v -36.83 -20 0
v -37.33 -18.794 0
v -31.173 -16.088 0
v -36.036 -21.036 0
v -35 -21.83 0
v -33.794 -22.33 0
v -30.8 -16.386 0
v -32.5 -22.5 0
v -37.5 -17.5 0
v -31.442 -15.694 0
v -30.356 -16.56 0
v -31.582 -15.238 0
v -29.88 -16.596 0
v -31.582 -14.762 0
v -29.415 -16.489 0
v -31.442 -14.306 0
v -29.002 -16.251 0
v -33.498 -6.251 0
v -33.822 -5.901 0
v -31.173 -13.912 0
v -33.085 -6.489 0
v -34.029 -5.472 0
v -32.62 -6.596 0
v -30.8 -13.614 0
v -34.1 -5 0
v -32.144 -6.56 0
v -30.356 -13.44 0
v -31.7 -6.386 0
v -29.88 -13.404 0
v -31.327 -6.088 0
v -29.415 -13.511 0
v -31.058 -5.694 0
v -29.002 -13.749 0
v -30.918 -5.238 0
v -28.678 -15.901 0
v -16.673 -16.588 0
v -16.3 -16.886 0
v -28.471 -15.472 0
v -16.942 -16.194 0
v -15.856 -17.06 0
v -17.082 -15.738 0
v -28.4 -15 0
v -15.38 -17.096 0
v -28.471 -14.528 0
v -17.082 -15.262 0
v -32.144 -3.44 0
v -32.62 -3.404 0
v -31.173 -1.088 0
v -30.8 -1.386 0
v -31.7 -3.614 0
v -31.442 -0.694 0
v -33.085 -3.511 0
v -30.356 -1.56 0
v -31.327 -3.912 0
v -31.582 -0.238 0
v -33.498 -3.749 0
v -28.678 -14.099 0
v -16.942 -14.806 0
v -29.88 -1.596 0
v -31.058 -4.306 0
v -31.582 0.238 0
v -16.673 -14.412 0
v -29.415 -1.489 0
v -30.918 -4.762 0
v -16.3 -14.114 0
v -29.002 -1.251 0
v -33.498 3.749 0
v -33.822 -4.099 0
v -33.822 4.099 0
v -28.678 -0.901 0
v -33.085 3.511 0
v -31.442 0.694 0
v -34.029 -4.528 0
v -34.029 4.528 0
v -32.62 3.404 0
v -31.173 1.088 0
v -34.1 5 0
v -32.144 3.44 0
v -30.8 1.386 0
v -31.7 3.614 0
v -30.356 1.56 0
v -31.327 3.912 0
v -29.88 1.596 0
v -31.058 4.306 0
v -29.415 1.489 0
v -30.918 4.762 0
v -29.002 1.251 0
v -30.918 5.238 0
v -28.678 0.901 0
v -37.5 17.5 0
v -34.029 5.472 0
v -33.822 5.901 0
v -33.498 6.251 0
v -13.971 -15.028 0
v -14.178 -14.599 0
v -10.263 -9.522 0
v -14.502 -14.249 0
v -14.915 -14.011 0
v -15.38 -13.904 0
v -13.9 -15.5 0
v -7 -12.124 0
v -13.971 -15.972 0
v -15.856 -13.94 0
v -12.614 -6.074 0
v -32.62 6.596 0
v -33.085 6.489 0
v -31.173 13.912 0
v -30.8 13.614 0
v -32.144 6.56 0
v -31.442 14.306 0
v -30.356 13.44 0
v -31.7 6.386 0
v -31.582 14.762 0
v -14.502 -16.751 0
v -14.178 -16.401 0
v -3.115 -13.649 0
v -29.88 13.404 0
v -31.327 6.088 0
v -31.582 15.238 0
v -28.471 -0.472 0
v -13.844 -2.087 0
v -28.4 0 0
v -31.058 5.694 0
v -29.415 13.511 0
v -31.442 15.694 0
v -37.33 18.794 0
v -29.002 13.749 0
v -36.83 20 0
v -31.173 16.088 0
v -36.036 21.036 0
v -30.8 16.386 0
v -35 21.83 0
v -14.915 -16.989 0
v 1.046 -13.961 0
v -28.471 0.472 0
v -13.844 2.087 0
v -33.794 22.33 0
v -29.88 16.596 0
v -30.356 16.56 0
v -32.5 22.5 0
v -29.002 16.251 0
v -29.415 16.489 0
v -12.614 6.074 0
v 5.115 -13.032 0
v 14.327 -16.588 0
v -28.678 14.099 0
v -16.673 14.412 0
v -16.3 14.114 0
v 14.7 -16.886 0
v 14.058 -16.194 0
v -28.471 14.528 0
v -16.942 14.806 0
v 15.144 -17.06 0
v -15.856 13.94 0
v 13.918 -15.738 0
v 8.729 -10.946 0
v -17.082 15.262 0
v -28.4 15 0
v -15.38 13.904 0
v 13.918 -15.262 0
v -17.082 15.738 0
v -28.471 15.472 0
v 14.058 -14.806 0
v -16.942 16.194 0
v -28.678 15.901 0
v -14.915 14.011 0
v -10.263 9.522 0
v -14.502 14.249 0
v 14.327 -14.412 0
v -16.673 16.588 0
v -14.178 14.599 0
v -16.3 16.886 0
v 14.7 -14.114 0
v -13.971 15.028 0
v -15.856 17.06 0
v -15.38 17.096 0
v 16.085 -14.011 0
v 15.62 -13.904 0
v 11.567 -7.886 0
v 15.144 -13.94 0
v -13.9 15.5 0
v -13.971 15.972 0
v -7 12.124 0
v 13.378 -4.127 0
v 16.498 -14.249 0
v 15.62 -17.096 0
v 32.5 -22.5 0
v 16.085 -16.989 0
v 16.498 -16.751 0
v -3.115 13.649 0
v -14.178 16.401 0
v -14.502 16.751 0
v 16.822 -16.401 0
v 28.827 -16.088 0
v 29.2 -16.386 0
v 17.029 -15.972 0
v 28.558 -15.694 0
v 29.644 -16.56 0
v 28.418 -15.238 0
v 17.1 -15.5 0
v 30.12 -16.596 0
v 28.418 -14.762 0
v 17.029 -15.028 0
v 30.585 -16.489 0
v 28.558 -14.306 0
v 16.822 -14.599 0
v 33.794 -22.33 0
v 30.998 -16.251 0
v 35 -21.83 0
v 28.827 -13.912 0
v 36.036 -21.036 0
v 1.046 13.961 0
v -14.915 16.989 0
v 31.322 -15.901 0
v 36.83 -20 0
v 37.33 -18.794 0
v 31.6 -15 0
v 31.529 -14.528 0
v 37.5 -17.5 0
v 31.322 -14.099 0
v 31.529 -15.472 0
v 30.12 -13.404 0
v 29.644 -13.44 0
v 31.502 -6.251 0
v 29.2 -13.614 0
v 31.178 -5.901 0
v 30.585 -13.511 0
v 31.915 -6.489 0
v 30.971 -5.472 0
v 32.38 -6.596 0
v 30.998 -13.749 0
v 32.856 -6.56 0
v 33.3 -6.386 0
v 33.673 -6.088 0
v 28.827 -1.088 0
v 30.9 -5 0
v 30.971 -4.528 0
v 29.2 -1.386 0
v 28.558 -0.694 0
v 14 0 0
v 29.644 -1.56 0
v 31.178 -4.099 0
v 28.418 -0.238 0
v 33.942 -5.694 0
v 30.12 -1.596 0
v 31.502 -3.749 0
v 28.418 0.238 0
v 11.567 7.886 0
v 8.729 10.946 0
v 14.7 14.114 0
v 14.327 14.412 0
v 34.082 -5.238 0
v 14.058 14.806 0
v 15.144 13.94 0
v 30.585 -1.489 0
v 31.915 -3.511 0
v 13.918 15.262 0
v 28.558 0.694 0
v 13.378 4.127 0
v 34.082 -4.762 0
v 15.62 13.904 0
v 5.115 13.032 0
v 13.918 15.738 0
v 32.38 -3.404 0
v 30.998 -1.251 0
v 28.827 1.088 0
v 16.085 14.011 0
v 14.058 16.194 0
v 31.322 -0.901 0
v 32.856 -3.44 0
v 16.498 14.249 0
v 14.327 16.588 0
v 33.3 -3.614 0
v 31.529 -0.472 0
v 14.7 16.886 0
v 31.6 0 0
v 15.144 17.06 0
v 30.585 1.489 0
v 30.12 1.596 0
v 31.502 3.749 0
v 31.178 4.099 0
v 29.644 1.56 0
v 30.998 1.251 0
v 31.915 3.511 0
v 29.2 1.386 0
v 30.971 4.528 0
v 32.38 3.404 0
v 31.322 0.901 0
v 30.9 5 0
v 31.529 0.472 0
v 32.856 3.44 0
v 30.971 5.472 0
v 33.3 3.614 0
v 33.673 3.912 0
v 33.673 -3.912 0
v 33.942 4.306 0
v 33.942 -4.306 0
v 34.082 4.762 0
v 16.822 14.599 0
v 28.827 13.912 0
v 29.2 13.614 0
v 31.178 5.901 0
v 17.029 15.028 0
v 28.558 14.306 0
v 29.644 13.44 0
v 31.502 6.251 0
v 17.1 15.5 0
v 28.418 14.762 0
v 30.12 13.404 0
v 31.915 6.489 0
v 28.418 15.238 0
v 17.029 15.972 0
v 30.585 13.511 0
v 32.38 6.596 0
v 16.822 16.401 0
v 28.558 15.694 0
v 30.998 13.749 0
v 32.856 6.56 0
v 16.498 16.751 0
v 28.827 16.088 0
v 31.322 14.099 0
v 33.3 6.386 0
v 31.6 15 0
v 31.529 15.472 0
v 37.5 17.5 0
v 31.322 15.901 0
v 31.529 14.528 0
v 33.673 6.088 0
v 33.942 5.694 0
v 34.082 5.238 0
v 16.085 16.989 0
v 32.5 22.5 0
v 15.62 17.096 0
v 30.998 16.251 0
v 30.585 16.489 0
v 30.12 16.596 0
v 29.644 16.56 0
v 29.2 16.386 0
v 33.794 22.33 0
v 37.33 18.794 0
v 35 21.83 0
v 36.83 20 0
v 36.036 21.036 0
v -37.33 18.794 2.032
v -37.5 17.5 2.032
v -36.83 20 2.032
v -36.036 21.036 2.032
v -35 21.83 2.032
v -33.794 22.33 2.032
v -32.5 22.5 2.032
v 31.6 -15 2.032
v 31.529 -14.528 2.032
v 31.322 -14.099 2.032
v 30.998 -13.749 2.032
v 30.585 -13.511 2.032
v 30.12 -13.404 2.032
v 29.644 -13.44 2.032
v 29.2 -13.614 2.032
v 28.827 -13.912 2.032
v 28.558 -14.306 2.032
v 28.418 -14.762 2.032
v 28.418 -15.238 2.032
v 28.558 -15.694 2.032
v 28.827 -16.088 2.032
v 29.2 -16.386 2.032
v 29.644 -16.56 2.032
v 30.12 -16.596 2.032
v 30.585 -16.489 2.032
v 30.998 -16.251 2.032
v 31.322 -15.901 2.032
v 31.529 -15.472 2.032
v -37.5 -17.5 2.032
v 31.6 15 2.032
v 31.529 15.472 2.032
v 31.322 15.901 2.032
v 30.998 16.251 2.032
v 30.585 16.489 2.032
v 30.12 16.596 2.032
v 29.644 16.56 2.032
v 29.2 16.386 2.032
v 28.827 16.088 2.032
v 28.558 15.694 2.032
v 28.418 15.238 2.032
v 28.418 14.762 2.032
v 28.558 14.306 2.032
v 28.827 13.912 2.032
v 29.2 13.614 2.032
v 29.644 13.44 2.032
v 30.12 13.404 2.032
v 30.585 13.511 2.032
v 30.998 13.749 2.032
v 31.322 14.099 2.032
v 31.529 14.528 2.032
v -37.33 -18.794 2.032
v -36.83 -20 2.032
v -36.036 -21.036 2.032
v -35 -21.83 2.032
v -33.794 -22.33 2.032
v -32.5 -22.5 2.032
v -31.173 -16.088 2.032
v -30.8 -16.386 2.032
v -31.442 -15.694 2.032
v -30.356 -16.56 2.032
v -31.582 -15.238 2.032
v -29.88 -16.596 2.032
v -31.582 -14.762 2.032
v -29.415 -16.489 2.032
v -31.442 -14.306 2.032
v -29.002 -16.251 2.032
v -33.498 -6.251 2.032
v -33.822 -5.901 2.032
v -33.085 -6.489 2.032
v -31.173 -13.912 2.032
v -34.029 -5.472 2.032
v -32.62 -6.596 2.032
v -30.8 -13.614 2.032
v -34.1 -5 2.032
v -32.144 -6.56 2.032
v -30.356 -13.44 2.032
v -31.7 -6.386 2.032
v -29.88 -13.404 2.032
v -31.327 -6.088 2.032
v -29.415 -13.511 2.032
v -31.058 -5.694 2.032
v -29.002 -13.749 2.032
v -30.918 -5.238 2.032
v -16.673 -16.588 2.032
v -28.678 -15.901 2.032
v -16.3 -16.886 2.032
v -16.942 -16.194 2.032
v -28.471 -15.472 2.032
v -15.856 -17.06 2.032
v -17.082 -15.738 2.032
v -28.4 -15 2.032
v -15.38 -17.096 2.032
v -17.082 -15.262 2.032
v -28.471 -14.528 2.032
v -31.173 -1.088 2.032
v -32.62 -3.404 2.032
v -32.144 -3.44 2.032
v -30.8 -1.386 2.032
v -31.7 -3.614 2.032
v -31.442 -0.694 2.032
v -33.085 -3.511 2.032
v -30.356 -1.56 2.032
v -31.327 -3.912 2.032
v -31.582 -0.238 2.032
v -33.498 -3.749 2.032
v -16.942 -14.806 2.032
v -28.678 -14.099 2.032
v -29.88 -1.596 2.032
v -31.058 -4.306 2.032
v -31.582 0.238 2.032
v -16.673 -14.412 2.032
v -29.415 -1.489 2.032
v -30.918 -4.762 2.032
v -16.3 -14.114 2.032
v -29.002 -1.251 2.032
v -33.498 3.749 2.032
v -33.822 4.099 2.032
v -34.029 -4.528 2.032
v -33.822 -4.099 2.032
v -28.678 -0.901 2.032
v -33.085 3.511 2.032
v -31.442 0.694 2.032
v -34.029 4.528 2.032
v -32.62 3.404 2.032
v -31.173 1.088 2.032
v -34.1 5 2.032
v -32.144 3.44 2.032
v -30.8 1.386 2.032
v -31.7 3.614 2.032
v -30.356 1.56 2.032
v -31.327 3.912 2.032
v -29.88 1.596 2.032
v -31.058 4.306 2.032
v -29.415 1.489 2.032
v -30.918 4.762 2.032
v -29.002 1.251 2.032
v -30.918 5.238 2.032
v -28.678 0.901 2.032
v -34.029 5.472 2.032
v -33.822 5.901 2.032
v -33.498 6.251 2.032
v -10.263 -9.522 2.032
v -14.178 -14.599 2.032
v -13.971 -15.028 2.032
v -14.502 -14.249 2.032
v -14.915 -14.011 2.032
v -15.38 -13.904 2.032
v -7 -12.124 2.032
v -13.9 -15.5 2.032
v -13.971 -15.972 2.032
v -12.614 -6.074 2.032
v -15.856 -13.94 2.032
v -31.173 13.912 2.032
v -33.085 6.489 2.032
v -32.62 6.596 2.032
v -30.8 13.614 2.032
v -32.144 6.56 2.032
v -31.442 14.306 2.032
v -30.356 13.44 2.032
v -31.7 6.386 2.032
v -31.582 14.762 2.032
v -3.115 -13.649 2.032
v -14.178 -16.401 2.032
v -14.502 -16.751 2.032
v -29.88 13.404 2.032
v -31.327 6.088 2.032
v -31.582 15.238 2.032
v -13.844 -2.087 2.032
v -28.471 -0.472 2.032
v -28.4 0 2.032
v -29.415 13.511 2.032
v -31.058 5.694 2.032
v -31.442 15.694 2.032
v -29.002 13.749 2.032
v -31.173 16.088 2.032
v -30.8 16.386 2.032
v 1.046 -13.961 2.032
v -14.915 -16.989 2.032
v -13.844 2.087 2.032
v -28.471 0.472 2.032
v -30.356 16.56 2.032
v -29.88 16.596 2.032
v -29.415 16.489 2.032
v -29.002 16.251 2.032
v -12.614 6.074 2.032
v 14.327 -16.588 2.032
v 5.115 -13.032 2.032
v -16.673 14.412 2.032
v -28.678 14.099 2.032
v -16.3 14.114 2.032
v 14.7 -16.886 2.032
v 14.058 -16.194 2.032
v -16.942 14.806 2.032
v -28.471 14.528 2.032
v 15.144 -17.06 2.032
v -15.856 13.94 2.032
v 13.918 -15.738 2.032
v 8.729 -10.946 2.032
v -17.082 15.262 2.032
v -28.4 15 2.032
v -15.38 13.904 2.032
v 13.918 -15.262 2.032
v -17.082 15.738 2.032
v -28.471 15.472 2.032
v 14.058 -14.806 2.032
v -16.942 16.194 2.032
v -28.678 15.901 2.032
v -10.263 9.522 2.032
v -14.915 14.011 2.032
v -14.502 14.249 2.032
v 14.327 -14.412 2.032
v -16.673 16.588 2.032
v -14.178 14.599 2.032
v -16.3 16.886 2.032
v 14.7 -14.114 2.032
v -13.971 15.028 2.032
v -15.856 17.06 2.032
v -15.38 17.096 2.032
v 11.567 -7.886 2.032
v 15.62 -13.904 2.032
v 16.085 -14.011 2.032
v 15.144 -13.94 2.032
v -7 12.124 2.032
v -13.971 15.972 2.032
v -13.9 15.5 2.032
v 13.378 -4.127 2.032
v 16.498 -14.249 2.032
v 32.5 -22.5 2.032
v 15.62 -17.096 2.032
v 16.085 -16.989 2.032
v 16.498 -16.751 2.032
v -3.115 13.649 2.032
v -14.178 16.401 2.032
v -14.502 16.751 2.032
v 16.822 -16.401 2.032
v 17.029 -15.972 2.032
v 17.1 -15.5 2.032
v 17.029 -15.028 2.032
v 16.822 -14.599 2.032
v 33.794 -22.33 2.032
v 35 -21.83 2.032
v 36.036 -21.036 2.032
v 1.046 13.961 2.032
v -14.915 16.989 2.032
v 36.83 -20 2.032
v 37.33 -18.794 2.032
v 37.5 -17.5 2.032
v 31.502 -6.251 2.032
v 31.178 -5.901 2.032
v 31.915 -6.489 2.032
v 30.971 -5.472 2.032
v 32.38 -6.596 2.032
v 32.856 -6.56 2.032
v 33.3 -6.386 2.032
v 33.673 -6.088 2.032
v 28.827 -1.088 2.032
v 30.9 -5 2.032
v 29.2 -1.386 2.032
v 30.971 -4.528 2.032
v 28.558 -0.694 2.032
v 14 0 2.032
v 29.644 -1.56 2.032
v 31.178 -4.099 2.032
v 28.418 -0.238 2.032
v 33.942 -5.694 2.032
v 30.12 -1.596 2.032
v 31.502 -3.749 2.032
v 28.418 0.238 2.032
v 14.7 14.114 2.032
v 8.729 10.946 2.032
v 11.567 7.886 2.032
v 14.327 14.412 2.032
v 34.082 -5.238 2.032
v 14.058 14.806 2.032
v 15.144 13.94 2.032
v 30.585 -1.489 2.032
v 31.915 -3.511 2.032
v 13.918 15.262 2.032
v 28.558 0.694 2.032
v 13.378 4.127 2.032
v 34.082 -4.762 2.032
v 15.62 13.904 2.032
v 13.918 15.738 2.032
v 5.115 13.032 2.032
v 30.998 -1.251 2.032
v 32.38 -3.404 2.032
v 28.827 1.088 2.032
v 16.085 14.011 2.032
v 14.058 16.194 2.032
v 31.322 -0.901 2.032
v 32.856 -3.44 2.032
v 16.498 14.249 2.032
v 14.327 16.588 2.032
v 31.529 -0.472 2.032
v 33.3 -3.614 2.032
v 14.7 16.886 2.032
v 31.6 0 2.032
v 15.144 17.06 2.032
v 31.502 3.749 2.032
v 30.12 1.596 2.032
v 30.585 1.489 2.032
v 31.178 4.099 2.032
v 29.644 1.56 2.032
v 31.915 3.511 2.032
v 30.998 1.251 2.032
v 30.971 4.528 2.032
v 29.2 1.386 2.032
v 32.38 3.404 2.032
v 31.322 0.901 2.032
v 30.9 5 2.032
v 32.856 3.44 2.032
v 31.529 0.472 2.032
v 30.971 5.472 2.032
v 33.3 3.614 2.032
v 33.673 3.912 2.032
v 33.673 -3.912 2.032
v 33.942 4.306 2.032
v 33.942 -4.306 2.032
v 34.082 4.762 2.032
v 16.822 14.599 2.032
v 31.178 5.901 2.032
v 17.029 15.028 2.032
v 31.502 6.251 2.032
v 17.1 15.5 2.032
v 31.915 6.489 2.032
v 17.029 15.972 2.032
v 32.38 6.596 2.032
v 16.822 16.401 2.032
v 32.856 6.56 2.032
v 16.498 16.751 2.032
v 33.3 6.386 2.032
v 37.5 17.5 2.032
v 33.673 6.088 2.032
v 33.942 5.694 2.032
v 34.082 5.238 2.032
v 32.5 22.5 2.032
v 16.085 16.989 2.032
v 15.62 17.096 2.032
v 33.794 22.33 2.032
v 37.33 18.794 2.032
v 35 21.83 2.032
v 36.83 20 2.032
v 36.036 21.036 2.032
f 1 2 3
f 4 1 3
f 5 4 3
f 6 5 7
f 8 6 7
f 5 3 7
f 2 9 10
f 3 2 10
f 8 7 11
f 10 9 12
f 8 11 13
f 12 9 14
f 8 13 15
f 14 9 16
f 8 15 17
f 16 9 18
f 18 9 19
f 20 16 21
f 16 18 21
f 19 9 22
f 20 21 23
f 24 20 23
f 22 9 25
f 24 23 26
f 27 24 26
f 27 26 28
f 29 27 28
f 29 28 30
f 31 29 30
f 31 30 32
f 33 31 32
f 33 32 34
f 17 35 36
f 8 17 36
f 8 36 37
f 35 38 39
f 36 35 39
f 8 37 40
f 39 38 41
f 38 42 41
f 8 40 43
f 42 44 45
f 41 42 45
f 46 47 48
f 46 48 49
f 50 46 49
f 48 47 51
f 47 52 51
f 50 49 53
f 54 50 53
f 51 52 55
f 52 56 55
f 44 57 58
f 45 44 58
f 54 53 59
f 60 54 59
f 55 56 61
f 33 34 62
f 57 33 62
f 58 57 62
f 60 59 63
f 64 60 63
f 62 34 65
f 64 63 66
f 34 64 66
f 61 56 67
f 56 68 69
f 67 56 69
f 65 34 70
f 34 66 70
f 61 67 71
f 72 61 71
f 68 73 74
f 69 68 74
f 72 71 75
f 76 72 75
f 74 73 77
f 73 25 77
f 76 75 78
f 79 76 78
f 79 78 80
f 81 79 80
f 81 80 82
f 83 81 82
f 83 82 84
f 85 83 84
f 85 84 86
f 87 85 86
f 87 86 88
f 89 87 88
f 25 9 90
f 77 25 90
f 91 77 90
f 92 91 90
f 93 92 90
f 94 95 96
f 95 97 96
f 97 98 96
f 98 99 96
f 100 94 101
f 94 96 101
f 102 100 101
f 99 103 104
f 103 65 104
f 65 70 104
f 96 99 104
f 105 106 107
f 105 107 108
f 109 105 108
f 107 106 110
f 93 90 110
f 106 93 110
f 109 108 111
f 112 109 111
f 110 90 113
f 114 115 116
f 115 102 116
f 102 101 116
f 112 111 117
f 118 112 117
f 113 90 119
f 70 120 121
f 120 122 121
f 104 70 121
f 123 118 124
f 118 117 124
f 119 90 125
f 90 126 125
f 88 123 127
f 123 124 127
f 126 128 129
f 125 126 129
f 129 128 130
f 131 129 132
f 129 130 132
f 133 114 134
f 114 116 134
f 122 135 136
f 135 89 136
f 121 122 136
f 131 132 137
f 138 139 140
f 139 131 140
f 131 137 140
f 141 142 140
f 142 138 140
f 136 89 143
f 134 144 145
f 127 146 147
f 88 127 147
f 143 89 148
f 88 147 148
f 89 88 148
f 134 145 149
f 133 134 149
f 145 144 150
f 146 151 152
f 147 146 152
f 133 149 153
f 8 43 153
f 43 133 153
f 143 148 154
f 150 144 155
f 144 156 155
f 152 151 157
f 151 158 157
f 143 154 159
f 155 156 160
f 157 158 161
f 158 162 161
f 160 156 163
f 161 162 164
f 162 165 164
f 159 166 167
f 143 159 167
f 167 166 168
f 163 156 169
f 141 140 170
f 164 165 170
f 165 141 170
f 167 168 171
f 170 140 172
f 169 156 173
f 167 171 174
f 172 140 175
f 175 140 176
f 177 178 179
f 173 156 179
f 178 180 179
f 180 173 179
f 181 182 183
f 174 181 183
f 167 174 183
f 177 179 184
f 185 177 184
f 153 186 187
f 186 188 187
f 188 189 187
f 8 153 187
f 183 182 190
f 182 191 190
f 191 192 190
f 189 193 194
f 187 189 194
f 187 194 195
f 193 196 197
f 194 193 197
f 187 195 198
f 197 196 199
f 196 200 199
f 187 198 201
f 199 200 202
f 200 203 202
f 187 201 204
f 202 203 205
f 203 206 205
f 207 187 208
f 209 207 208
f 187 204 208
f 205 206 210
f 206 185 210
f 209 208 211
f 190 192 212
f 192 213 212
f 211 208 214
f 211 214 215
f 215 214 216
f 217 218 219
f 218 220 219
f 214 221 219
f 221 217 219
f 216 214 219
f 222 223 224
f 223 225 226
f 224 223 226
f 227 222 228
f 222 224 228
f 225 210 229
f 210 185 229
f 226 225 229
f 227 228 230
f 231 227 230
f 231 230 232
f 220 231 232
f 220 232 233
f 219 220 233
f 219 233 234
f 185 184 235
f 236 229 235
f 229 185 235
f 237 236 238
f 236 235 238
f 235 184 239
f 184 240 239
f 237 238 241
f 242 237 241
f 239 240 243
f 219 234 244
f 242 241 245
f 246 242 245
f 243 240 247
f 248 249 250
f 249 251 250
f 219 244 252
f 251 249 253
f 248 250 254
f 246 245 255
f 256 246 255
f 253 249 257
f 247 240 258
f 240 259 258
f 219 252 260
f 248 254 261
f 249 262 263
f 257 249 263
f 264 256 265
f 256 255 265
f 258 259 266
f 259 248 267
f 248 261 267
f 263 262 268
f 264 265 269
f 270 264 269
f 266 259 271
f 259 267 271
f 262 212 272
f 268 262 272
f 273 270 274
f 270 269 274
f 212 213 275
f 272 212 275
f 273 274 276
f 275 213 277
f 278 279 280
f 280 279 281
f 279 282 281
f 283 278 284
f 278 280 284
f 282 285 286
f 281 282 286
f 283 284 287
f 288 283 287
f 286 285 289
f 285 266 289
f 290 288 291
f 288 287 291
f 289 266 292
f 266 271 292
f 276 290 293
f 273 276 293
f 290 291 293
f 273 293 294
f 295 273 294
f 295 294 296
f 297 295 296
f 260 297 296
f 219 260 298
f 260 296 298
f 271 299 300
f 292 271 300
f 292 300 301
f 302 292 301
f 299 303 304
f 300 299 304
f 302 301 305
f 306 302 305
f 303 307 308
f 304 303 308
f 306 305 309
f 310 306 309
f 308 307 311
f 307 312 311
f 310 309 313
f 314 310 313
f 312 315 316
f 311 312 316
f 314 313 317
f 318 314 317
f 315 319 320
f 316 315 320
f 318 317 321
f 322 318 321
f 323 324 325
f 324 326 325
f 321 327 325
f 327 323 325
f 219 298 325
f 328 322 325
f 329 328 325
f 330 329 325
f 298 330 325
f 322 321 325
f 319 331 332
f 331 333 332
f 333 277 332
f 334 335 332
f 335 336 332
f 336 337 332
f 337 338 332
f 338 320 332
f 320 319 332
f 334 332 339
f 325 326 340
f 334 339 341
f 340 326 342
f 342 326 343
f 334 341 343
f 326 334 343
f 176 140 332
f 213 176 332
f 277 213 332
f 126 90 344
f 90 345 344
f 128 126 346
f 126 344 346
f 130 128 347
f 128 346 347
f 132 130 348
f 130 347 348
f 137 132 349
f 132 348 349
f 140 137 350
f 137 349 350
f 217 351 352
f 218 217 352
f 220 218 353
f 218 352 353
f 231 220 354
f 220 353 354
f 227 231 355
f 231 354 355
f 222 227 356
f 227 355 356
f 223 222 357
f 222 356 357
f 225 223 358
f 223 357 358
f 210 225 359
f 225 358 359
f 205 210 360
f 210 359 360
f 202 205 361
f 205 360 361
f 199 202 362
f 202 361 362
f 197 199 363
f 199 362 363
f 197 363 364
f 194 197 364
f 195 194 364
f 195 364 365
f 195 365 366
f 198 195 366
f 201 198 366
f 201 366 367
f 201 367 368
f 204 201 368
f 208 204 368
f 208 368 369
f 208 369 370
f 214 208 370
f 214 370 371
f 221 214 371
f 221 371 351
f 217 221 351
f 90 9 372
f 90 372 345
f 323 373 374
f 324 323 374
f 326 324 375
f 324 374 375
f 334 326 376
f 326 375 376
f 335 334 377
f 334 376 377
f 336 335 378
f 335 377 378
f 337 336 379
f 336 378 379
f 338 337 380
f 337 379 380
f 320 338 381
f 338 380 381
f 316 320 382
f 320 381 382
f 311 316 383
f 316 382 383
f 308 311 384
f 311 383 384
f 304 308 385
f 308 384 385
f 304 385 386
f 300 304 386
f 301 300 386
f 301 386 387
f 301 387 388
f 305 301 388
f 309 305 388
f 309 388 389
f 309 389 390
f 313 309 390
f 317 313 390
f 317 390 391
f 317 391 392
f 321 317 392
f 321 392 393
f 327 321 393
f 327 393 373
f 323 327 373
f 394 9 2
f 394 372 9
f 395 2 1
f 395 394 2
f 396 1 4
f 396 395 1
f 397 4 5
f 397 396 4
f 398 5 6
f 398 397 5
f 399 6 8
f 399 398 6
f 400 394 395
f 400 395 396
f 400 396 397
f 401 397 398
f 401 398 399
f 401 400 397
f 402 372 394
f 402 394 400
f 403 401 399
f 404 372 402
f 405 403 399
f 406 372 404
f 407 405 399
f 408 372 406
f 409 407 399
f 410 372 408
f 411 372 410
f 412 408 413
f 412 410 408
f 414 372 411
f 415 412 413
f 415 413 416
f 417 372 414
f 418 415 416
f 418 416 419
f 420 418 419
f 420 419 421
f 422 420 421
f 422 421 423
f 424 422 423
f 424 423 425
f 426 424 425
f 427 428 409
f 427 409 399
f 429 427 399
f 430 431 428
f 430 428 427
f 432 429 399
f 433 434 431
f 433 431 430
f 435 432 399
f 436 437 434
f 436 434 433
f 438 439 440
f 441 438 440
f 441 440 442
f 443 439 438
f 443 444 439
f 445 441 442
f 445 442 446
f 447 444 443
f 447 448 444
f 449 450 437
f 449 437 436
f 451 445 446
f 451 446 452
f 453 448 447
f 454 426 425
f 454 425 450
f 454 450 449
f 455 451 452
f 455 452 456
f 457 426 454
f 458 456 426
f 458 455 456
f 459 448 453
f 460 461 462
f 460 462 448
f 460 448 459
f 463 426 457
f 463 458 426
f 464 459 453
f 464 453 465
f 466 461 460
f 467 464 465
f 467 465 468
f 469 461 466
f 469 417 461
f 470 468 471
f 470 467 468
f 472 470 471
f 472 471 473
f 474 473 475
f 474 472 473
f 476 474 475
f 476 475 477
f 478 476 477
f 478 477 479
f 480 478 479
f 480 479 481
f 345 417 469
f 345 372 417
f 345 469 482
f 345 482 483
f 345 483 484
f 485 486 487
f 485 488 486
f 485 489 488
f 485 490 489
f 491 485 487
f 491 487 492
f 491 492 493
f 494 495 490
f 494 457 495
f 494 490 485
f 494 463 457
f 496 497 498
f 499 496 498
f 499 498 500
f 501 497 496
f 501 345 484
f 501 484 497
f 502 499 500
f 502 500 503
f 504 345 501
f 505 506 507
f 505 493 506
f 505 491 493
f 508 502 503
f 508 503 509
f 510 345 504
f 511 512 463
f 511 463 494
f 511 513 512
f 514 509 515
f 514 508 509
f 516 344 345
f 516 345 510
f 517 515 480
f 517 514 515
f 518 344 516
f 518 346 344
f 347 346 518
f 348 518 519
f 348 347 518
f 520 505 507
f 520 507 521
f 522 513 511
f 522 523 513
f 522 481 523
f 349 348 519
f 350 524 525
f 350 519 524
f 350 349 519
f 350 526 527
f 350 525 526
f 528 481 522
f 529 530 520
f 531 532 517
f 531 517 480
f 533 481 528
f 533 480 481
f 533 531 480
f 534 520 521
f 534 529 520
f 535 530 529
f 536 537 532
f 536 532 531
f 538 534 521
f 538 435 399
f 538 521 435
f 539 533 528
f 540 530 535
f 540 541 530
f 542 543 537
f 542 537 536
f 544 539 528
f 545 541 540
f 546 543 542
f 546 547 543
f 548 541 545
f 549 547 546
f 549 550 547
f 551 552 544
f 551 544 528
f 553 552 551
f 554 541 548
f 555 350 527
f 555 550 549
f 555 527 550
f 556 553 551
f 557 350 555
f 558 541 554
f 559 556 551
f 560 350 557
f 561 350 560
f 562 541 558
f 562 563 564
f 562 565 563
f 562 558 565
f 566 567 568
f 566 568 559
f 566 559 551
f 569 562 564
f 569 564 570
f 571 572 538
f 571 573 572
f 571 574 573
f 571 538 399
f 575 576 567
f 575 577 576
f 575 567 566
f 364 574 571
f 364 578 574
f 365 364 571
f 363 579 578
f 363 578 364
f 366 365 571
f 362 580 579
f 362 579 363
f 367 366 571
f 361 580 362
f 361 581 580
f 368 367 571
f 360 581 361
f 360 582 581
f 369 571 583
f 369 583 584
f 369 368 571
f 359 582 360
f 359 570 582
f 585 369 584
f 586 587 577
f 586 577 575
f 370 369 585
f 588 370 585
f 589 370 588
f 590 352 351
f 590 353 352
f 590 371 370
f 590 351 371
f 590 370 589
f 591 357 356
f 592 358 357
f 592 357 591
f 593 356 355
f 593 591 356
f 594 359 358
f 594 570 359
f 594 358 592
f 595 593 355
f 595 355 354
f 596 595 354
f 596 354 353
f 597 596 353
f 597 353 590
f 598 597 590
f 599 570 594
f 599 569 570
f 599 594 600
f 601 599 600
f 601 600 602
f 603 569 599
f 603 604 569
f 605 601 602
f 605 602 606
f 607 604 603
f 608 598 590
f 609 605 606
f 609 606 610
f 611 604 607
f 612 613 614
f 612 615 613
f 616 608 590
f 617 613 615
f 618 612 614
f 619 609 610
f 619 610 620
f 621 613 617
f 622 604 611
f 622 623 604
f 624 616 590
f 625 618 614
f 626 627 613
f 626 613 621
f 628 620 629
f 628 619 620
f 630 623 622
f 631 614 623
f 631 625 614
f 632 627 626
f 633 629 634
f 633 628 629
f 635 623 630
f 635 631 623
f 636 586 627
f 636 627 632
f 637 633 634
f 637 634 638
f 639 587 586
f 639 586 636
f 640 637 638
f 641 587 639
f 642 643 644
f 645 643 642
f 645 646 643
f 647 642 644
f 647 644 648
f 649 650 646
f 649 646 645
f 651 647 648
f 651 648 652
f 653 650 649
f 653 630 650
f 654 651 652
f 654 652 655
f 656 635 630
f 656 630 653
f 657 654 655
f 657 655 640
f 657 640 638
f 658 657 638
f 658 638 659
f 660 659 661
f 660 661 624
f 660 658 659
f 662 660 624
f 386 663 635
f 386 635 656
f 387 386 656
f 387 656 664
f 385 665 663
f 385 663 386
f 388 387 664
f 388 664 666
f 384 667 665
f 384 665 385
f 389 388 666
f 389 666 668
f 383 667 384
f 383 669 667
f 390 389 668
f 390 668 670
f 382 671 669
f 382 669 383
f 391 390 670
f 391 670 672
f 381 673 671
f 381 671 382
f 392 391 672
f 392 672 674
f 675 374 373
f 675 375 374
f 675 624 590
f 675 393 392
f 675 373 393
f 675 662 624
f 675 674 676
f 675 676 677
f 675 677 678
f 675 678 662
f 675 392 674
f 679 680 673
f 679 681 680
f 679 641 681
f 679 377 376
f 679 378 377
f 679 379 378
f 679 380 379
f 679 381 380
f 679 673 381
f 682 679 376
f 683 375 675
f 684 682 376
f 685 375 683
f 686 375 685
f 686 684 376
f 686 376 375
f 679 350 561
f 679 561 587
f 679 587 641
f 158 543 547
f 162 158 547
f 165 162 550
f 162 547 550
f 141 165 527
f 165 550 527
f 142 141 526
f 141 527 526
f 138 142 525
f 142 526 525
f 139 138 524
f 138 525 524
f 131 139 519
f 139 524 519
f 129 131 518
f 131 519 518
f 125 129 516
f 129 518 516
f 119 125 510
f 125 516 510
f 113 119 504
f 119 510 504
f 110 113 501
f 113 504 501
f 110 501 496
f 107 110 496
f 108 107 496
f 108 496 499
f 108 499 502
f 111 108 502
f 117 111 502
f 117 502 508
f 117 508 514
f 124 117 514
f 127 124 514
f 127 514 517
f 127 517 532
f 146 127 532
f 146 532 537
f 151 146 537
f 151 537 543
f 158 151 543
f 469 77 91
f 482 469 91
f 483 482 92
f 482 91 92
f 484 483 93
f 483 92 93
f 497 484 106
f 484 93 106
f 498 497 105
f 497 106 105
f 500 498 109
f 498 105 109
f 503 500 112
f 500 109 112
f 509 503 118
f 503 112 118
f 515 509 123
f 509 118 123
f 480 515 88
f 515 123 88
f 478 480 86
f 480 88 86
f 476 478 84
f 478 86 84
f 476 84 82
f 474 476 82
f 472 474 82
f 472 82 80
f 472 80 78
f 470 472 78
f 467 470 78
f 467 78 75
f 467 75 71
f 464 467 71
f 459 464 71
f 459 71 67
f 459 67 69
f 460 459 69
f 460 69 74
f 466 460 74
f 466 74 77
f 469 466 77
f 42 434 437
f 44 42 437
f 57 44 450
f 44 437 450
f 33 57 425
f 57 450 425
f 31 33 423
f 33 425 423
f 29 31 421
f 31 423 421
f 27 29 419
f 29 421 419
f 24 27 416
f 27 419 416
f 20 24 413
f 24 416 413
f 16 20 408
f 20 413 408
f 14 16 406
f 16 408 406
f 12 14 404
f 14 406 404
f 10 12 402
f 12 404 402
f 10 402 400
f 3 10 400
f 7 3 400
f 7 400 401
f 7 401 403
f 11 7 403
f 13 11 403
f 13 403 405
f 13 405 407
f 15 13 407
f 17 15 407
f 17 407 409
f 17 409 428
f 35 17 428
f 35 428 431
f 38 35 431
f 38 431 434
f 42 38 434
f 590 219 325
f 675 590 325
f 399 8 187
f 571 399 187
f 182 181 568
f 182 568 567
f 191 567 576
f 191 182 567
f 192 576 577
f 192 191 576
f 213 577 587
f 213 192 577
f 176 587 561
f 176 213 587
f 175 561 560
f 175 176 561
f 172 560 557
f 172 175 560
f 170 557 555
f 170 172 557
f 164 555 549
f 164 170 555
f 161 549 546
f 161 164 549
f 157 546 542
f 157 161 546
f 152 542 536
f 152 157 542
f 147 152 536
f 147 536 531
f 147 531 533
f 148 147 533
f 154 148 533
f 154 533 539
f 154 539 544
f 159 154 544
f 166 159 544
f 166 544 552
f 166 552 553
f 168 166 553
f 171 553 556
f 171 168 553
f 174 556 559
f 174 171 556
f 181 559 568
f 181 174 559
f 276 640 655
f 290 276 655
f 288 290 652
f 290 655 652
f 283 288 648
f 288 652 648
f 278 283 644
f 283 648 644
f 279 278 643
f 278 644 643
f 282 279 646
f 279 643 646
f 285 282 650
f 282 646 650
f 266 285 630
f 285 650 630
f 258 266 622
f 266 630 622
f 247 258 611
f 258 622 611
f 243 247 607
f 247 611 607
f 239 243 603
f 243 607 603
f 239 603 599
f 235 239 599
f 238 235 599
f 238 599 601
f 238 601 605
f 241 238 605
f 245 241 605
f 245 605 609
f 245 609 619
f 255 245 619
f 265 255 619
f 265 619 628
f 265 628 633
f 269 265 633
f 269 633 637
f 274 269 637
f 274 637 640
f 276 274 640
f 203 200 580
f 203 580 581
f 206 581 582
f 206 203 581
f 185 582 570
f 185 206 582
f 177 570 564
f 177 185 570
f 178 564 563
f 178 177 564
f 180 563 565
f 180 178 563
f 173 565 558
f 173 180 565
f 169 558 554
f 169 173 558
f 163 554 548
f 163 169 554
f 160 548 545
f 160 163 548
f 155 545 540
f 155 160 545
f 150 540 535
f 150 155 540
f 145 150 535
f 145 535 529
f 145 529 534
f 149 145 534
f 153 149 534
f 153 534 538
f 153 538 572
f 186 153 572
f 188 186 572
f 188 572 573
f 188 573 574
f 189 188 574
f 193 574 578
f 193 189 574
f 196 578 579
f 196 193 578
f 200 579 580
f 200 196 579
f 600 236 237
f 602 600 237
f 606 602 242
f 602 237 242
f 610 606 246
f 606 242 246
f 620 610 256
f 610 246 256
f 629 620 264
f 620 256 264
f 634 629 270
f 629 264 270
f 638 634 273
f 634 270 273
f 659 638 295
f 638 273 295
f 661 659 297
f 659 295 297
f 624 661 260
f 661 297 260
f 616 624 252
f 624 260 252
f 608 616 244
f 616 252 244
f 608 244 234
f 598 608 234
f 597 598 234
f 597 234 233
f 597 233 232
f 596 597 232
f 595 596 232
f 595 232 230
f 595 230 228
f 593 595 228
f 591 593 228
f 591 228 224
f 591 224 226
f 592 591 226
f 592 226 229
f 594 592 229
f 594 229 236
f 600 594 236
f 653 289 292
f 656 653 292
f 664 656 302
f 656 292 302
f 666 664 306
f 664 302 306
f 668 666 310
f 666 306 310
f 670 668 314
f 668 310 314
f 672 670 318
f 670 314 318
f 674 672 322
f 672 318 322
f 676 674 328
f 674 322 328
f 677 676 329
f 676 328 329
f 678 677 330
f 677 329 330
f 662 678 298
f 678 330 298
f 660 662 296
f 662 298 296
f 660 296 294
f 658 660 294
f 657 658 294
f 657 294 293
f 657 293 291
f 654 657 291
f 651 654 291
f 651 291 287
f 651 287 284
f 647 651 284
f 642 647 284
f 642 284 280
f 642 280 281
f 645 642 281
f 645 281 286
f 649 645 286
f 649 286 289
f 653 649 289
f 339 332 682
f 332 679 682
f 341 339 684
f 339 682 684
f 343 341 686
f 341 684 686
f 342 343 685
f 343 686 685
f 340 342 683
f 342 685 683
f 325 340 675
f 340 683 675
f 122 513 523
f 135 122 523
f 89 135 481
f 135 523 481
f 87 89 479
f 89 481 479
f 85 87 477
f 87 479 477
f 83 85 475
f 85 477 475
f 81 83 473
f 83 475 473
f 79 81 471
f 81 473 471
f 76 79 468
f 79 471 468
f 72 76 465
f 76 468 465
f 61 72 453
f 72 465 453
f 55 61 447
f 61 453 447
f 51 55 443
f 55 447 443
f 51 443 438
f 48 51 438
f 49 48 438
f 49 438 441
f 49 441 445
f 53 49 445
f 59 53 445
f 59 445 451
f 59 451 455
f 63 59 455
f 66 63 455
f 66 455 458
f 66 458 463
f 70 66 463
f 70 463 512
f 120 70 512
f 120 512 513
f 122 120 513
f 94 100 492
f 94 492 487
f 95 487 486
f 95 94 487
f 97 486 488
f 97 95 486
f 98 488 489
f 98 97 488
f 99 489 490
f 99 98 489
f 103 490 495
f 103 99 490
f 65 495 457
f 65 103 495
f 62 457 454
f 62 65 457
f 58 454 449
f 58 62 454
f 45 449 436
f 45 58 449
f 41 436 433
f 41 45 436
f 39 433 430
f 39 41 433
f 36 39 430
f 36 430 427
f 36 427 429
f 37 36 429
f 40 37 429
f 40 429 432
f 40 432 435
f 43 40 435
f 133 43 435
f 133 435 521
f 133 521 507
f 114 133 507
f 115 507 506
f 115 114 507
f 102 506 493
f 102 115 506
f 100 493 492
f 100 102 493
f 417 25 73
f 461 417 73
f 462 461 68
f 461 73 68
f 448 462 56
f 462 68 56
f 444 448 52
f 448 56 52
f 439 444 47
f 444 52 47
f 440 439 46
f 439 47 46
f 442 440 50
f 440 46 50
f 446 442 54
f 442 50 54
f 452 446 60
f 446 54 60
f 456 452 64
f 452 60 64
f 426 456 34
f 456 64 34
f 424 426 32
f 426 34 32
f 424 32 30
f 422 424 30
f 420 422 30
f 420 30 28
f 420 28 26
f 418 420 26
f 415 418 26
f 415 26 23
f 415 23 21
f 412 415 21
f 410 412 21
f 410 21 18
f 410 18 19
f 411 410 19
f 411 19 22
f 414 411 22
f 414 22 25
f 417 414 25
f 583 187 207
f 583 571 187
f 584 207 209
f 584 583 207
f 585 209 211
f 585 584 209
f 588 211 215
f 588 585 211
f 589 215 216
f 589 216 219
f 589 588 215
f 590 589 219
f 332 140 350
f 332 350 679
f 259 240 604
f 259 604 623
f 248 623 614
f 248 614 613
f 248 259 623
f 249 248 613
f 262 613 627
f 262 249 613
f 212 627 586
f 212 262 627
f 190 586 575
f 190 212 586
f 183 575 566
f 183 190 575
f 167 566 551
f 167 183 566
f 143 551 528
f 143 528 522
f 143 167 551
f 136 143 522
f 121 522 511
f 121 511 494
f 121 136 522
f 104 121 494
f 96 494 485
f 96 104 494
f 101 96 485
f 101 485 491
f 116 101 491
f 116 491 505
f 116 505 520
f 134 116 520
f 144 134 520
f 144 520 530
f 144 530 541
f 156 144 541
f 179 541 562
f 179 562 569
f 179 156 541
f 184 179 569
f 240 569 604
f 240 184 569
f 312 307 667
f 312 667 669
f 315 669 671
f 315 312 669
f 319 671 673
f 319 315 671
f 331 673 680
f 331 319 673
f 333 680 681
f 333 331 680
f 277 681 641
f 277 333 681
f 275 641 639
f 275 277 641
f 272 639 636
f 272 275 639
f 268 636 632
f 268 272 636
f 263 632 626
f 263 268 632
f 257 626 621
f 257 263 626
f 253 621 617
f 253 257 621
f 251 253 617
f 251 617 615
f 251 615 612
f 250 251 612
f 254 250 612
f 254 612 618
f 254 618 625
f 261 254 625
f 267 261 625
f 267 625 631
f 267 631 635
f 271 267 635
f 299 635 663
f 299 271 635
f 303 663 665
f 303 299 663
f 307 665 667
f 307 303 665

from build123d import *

# Parameters (mm, degrees)
SKETCH1_W           = 75
SKETCH1_H           = 45
SKETCH1_R           = 14
SKETCH1_R_2         = 1.6
BOSS_EXTRUDE1_DEPTH = 2.032
FILLET2_R           = 5
SKETCH2_R           = 1.6
CUT_EXTRUDE1_DEPTH  = 3.032
SKETCH3_R           = 1.6
CUT_EXTRUDE2_DEPTH  = 3.032


with BuildPart() as part:
    # Sketch1 → Boss-Extrude1 (new body)
    with BuildSketch(Plane.XY):
        Rectangle(SKETCH1_W, SKETCH1_H)
        Circle(SKETCH1_R, mode=Mode.SUBTRACT)
        with Locations((-15.5, 15.5)):
            Circle(SKETCH1_R_2, mode=Mode.SUBTRACT)
        with Locations((15.5, 15.5)):
            Circle(SKETCH1_R_2, mode=Mode.SUBTRACT)
        with Locations((15.5, -15.5)):
            Circle(SKETCH1_R_2, mode=Mode.SUBTRACT)
        with Locations((-15.5, -15.5)):
            Circle(SKETCH1_R_2, mode=Mode.SUBTRACT)
    extrude(amount=BOSS_EXTRUDE1_DEPTH)

    # Fillet2
    fillet2_edges = [part.edges().sort_by_distance(p)[0] for p in [
        (37.5, -22.5, 1.016),
        (-37.5, -22.5, 1.016),
        (-37.5, 22.5, 1.016),
        (37.5, 22.5, 1.016),
    ]]
    fillet(fillet2_edges, radius=FILLET2_R)

    # Sketch2 → Cut-Extrude1 (cut, through all)
    with BuildSketch(Plane.XY.offset(2.032)):
        with Locations((-30, 0)):
            Circle(SKETCH2_R)
        with Locations((-30, 15)):
            Circle(SKETCH2_R)
        with Locations((-30, -15)):
            Circle(SKETCH2_R)
        with Locations((30, -15)):
            Circle(SKETCH2_R)
        with Locations((30, 15)):
            Circle(SKETCH2_R)
        with Locations((30, 0)):
            Circle(SKETCH2_R)
    extrude(amount=-CUT_EXTRUDE1_DEPTH, mode=Mode.SUBTRACT)

    # Sketch3 → Cut-Extrude2 (cut, through all)
    with BuildSketch(Plane(origin=(0, 0, 0), x_dir=(-1, 0, 0), z_dir=(0, 0, -1))):
        with Locations((-32.5, 5)):
            Circle(SKETCH3_R)
        with Locations((-32.5, -5)):
            Circle(SKETCH3_R)
        with Locations((32.5, -5)):
            Circle(SKETCH3_R)
        with Locations((32.5, 5)):
            Circle(SKETCH3_R)
    extrude(amount=-CUT_EXTRUDE2_DEPTH, mode=Mode.SUBTRACT)


solid = part.part
